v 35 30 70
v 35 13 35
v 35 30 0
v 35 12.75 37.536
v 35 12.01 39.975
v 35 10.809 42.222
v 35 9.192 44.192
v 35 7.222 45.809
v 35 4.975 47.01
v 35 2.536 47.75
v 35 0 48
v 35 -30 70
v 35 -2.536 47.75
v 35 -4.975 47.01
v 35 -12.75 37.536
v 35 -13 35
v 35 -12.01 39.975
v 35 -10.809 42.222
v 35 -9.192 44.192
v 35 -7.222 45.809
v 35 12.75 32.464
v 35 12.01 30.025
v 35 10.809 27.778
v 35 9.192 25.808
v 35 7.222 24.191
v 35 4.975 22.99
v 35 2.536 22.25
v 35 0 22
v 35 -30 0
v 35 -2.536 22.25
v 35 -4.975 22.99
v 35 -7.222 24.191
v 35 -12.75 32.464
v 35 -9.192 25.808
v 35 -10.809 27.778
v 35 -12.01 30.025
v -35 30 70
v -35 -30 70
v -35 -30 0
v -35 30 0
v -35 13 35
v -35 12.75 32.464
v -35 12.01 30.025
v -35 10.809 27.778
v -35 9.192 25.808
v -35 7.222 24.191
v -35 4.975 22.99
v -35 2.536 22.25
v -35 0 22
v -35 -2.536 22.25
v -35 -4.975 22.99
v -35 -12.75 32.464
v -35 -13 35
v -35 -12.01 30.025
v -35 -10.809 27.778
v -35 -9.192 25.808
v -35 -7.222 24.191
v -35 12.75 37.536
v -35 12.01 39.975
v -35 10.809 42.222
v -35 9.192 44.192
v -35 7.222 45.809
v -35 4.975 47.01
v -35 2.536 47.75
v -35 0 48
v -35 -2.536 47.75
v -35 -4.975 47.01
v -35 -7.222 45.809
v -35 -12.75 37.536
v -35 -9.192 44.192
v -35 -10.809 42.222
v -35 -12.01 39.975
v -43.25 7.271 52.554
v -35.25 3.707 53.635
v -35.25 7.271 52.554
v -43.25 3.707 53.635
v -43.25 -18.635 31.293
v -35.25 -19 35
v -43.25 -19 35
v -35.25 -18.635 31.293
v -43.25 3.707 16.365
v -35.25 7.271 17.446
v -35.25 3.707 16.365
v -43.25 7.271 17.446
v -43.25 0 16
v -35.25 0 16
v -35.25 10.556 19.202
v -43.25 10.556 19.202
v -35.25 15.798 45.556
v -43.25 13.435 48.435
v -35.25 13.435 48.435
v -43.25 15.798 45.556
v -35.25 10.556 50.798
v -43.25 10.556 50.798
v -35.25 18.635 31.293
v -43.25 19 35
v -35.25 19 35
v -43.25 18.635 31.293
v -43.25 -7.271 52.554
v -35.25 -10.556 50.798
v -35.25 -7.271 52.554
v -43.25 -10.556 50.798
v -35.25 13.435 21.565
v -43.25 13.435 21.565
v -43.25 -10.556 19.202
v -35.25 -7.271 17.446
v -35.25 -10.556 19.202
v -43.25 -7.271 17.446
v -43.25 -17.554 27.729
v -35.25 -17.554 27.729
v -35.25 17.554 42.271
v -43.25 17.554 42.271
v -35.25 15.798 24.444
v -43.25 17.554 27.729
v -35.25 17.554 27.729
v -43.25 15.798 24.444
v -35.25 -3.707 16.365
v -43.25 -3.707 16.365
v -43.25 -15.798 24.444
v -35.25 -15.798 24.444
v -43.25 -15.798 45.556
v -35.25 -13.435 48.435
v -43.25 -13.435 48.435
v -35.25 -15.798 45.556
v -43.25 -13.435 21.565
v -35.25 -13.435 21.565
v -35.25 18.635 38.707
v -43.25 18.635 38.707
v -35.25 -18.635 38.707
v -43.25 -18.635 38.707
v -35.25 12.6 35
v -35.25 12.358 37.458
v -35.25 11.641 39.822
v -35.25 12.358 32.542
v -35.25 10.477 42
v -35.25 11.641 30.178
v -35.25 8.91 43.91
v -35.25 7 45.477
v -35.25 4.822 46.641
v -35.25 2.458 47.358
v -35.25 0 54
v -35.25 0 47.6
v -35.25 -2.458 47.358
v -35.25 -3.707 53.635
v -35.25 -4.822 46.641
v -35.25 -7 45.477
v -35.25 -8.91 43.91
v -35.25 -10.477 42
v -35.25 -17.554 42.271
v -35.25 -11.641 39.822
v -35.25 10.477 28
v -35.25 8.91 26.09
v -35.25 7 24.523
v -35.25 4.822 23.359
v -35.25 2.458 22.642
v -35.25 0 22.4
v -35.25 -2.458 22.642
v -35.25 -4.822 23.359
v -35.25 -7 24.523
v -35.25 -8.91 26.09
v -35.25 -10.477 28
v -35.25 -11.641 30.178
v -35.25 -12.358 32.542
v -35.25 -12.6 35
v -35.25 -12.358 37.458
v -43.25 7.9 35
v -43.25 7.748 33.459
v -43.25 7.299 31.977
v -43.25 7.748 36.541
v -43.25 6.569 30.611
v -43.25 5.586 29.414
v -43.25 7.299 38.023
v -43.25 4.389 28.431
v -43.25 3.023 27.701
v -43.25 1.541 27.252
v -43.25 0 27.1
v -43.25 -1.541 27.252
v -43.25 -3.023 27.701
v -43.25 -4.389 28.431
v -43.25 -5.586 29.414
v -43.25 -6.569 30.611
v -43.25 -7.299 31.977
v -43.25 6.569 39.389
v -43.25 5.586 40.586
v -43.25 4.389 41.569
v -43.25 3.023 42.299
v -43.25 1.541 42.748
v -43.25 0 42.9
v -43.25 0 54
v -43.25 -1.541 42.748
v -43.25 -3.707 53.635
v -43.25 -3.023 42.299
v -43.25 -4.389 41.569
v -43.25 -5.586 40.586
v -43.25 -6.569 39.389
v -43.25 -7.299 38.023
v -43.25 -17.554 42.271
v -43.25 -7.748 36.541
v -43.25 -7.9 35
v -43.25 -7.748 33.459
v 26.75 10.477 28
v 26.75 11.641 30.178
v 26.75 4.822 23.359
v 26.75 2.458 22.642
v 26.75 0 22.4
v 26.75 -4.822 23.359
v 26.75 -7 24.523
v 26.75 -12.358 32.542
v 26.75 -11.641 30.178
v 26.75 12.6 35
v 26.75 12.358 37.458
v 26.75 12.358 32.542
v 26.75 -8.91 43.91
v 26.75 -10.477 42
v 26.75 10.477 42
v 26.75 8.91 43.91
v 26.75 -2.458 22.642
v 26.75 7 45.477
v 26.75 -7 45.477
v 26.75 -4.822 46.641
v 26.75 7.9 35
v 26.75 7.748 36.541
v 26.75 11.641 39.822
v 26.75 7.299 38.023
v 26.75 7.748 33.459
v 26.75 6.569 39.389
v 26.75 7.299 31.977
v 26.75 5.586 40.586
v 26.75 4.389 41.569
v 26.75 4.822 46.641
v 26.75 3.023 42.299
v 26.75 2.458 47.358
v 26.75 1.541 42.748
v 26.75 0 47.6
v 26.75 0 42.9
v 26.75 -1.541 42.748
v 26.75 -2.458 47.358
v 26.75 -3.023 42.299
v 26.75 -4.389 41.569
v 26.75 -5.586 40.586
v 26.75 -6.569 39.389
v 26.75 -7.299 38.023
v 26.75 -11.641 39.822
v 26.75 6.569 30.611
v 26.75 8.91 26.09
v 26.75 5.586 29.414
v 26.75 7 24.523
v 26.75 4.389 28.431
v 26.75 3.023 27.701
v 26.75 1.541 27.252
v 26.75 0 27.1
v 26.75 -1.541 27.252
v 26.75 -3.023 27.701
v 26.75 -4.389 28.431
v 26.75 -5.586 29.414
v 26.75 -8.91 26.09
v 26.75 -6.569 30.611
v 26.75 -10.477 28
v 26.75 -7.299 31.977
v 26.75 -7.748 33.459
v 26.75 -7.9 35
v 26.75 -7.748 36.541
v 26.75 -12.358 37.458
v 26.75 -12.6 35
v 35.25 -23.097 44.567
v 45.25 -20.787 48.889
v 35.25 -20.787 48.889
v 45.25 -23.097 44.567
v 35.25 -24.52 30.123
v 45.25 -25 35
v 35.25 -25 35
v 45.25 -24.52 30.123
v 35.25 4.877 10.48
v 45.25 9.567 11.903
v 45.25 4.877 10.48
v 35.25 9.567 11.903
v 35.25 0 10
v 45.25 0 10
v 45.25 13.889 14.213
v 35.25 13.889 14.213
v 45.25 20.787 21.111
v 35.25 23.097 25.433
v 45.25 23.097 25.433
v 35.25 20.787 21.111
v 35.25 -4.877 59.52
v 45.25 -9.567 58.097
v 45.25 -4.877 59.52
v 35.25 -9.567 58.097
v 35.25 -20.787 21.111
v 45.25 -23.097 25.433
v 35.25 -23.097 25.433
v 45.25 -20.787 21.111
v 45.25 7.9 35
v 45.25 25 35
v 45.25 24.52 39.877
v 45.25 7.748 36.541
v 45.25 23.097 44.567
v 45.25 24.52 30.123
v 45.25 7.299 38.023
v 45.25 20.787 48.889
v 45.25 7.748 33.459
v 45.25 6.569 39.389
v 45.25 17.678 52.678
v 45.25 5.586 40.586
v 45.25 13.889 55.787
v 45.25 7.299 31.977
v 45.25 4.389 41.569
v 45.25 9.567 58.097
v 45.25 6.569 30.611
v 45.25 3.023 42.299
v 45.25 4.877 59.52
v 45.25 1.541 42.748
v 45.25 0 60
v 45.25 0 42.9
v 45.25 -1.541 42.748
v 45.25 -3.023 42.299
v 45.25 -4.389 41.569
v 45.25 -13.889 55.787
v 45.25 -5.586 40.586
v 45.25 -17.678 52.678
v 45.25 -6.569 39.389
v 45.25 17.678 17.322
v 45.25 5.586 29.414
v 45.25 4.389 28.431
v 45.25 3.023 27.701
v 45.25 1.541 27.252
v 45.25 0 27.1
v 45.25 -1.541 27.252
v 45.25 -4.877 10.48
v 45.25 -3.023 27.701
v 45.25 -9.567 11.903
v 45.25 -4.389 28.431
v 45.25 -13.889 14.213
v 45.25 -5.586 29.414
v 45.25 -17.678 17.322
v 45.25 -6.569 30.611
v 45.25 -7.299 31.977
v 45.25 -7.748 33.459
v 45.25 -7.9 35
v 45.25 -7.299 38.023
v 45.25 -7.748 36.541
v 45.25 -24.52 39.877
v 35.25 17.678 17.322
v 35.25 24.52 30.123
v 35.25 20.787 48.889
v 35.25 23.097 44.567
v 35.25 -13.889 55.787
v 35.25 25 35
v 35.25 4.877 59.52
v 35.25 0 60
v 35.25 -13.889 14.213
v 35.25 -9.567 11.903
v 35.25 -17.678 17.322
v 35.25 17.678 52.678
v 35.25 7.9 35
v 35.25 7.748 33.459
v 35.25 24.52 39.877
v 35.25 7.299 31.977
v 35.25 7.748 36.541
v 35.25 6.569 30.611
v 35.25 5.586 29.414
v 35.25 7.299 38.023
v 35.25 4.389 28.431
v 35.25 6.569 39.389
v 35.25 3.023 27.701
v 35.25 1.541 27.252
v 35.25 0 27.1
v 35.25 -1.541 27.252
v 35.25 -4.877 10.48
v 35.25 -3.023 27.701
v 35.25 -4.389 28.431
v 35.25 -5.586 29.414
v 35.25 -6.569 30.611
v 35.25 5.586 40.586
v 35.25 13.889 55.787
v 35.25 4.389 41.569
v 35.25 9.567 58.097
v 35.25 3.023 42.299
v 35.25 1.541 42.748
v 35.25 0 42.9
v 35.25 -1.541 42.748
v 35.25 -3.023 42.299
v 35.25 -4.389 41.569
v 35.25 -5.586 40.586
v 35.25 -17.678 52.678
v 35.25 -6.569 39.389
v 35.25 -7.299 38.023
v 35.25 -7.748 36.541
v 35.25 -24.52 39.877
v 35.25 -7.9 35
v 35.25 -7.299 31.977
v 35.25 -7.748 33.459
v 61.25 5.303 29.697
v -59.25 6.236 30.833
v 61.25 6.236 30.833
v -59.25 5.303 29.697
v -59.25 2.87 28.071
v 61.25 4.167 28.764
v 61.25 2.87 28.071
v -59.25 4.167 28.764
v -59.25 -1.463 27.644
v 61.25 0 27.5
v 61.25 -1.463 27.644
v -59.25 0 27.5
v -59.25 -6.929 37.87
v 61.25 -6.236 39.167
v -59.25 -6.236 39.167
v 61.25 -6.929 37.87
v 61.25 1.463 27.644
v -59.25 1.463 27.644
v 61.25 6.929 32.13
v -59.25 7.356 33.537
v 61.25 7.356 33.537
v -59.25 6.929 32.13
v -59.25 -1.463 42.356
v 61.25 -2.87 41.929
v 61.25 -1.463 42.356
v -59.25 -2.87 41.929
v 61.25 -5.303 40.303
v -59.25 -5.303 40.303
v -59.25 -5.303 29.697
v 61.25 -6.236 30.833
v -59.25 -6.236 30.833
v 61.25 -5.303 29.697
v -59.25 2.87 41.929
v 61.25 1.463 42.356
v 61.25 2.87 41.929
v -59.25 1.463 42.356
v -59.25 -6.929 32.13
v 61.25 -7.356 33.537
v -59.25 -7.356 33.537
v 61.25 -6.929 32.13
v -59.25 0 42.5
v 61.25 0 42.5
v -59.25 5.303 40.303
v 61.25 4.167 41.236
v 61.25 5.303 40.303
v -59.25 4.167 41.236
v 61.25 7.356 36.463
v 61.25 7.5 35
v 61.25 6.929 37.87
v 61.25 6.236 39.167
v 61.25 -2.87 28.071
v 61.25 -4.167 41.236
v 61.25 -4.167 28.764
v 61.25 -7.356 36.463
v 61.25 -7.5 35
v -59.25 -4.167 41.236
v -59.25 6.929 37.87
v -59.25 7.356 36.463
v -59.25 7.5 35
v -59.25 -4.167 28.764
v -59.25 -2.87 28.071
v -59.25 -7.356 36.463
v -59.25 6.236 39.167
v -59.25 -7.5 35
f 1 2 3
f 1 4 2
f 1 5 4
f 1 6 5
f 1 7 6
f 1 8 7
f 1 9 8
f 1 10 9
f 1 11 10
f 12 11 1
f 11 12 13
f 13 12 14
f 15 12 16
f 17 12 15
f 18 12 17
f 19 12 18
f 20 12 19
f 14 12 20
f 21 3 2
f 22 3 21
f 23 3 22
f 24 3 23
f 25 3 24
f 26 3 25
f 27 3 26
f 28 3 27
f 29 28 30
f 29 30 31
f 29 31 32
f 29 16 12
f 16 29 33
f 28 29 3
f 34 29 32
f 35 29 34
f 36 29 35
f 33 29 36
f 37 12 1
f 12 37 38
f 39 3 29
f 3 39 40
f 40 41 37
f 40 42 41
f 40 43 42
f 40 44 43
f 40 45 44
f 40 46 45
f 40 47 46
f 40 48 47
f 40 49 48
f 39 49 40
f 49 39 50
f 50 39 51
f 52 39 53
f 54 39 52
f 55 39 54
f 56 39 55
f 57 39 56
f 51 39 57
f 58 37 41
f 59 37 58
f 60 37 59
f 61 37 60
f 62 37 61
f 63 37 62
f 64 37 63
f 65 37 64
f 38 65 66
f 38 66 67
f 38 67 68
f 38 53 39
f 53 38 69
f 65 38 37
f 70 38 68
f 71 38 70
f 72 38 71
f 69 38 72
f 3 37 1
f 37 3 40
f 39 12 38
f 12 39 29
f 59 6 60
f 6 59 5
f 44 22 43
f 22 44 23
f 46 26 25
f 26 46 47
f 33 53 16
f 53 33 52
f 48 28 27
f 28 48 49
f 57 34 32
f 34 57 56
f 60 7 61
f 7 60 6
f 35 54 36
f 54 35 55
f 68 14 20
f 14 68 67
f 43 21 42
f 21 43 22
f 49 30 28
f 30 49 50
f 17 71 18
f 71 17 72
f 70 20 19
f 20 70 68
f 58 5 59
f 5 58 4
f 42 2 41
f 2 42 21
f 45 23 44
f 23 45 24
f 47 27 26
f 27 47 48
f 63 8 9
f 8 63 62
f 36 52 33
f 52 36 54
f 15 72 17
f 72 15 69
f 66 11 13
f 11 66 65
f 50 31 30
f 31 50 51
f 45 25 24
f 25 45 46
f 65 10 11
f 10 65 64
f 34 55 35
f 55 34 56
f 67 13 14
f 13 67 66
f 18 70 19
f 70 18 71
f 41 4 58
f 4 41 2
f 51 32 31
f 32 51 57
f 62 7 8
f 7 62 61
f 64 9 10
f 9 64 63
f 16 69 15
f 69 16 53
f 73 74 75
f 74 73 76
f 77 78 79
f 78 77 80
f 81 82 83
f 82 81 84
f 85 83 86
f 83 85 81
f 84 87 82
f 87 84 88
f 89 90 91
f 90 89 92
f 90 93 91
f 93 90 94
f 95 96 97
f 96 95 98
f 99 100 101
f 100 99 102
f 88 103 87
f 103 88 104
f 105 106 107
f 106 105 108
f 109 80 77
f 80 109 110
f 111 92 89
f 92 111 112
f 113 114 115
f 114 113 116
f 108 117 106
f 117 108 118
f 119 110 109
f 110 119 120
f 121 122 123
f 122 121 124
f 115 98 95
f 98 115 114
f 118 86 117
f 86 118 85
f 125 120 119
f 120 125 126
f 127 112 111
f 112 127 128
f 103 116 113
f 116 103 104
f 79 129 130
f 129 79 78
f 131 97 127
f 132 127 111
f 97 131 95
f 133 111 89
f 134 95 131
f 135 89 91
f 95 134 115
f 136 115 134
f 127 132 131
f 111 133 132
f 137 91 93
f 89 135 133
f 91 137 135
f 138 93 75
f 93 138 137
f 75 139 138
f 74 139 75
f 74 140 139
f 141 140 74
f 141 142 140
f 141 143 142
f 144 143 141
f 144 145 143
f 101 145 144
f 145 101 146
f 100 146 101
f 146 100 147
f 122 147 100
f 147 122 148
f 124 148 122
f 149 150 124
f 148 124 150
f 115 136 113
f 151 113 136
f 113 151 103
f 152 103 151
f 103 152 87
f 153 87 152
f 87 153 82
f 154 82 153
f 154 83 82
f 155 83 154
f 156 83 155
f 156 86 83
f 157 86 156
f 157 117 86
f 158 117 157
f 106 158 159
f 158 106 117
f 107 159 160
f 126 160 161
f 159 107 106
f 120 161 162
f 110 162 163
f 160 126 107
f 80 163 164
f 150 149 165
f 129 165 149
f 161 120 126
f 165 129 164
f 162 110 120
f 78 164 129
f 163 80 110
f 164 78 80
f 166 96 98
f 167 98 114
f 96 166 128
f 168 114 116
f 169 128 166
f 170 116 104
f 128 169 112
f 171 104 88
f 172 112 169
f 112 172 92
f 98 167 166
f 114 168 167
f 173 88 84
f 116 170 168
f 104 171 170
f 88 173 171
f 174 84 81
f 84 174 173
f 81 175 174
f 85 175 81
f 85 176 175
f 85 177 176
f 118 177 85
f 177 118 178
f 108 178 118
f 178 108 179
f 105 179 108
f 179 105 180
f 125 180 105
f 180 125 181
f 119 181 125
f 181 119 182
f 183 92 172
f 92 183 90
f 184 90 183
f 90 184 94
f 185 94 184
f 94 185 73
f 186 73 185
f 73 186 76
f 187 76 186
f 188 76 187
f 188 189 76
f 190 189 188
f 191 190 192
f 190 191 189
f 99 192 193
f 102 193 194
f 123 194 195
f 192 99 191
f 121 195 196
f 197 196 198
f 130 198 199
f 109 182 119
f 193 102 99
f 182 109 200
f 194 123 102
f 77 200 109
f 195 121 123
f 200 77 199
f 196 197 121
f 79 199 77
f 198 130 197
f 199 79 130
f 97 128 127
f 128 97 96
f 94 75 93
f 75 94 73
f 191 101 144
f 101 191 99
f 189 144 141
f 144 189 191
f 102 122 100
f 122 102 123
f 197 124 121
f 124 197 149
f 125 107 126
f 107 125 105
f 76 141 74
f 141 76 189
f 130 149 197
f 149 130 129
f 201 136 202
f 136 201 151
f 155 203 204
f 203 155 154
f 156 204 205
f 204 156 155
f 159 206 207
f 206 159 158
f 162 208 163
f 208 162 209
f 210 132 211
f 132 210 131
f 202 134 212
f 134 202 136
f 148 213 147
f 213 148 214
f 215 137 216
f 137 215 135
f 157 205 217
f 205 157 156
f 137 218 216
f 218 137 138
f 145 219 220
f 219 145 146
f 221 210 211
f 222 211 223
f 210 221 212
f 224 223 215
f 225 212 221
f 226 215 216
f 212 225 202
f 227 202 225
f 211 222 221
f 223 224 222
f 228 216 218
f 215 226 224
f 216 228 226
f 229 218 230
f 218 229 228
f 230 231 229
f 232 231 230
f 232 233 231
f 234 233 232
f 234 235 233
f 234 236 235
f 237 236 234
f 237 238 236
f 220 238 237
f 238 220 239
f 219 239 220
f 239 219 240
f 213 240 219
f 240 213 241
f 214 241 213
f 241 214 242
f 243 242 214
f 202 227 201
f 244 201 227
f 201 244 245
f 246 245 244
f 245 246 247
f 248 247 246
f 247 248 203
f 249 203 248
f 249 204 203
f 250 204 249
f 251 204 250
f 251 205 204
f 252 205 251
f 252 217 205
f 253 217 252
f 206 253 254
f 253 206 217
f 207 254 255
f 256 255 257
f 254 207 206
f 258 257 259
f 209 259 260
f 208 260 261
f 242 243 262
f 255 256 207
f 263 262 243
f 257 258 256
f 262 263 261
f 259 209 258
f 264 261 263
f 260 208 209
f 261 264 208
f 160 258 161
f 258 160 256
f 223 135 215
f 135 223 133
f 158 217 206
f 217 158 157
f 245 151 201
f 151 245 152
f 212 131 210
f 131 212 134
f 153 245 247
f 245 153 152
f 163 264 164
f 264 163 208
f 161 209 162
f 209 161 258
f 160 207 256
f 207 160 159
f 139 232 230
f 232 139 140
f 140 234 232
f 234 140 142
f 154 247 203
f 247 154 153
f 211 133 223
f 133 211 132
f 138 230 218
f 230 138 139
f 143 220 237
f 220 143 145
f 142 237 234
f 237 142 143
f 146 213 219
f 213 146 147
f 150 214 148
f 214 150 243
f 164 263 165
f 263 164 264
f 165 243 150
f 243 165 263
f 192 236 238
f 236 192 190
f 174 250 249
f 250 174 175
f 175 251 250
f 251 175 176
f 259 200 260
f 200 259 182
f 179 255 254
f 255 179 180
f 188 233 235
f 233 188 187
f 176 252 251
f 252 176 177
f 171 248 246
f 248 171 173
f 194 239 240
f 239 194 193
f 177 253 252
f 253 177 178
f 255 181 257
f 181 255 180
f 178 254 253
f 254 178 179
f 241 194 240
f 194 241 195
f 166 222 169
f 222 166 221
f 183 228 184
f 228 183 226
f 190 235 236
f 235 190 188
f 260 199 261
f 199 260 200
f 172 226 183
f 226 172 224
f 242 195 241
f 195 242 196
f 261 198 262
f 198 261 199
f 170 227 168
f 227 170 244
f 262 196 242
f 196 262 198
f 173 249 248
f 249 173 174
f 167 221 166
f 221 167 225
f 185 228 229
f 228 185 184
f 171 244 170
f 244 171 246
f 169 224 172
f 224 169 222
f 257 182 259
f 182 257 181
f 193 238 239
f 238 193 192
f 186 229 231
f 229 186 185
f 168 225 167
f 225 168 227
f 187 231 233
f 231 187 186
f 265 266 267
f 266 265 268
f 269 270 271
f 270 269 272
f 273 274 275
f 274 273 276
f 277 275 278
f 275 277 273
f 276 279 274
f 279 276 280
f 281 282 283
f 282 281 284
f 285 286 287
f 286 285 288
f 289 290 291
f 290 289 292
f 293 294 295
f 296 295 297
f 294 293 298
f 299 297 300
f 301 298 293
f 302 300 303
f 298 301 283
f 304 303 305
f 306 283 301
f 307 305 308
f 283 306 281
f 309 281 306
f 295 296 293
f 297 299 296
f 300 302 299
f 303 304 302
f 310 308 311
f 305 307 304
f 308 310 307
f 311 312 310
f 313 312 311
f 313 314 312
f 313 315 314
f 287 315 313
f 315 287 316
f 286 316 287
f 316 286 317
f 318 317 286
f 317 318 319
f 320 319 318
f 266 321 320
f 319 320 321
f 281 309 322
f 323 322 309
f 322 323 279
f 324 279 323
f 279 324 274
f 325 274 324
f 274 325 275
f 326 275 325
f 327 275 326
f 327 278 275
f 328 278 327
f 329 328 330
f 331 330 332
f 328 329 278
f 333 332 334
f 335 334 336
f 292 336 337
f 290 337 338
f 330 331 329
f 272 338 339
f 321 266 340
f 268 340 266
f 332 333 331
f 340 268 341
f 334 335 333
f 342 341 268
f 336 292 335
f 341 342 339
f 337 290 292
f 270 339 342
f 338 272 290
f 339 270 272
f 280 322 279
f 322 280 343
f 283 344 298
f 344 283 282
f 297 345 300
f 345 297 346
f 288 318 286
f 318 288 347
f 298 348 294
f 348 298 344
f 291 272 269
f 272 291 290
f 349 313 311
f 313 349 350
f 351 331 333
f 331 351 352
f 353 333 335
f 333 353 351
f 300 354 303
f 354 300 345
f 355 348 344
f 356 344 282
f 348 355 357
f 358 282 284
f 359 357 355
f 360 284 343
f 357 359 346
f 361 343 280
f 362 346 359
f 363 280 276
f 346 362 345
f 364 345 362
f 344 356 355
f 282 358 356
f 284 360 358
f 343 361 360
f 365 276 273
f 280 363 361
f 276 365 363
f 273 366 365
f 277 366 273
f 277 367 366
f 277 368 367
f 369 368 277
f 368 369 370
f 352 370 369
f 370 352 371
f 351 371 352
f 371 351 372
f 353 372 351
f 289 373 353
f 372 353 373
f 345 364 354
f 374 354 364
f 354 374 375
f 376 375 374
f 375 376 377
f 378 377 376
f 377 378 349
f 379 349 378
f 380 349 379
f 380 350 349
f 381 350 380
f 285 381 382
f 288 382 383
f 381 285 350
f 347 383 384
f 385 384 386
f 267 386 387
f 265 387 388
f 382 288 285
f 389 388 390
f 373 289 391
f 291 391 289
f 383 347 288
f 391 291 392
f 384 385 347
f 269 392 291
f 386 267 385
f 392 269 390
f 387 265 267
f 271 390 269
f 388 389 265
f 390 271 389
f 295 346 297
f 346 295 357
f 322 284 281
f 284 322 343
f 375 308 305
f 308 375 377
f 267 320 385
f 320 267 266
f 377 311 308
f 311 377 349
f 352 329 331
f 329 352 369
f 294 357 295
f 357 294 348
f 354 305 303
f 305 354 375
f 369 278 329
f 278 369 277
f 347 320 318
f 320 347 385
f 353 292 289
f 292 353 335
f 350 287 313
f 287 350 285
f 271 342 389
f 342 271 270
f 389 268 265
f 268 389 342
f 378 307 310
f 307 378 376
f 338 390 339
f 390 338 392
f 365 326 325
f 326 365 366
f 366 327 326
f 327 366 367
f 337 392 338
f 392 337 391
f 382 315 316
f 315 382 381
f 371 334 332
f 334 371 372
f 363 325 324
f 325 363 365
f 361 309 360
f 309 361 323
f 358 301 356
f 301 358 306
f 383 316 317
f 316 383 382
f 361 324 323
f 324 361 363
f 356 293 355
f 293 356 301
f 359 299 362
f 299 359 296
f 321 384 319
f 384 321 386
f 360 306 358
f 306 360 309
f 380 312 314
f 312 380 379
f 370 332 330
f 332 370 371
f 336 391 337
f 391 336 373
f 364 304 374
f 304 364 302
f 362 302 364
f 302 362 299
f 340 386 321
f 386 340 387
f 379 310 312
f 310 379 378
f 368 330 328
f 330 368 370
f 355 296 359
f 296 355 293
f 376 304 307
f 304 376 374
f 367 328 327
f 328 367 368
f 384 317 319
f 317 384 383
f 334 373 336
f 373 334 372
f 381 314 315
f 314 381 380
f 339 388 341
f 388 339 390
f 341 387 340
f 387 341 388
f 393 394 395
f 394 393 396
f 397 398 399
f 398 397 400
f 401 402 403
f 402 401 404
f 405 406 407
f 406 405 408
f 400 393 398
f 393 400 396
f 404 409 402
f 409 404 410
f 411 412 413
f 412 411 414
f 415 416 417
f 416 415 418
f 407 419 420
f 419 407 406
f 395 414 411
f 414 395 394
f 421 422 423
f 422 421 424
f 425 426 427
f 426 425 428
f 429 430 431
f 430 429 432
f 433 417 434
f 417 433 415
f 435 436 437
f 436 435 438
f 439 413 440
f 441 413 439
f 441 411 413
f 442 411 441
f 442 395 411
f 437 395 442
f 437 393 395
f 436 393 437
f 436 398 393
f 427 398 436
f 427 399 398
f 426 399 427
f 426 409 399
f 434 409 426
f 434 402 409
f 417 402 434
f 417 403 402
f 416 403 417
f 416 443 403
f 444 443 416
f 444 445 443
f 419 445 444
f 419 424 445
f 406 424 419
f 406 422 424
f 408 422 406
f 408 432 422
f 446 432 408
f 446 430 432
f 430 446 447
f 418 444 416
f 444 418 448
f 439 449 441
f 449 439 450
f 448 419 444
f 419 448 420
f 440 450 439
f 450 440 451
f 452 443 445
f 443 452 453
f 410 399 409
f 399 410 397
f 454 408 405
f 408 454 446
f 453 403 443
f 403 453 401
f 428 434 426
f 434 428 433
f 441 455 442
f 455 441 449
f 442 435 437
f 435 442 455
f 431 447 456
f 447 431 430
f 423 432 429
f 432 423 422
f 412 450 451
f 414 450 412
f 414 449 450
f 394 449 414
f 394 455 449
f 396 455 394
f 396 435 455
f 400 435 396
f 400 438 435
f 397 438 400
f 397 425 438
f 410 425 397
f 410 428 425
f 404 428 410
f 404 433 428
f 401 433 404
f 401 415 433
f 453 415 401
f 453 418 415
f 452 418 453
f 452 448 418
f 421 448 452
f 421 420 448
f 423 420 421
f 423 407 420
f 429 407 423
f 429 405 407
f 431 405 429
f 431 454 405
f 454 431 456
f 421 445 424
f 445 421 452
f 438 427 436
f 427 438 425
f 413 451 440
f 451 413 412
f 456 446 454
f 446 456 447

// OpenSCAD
$fn = 32;

// ------------------------------------------------------------------------
// Bushed housing: 70 x 60 x 70 mm housing, bushing d25.2
// Every part is its own module, assembly() places them once.
// ------------------------------------------------------------------------

// --- part 1 ---
module housing() {
  difference() {
    translate([-35, -30, 0]) cube([70, 60, 70]);
    translate([0, 0, 35]) rotate([0, 90, 0]) cylinder(h = 72, d = 26, center = true);
  }
}

// --- part 2 ---
module bushing() {
  difference() {
    union() {
      cylinder(h = 8, d = 38);
      translate([0, 0, 8]) cylinder(h = 62, d = 25.2);
    }
    translate([0, 0, -1]) cylinder(h = 72, d = 15.8);
  }
}

// --- part 3 ---
module shaft() {
  translate([0, 0, -60.25]) cylinder(h = 120.5, d = 15);
}

// --- part 4 ---
module cover() {
  difference() {
    cylinder(h = 10, d = 50);
    translate([0, 0, -1]) cylinder(h = 12, d = 15.8);
  }
}

// --- assembly ---
module assembly() {
  translate([0, 0, 0]) rotate([0, 0, 0]) housing();
  translate([-43.25, 0, 35]) rotate([0, 90, 0]) bushing();
  translate([1, 0, 35]) rotate([0, 90, 0]) shaft();
  translate([35.25, 0, 35]) rotate([0, 90, 0]) cover();
}

assembly();
